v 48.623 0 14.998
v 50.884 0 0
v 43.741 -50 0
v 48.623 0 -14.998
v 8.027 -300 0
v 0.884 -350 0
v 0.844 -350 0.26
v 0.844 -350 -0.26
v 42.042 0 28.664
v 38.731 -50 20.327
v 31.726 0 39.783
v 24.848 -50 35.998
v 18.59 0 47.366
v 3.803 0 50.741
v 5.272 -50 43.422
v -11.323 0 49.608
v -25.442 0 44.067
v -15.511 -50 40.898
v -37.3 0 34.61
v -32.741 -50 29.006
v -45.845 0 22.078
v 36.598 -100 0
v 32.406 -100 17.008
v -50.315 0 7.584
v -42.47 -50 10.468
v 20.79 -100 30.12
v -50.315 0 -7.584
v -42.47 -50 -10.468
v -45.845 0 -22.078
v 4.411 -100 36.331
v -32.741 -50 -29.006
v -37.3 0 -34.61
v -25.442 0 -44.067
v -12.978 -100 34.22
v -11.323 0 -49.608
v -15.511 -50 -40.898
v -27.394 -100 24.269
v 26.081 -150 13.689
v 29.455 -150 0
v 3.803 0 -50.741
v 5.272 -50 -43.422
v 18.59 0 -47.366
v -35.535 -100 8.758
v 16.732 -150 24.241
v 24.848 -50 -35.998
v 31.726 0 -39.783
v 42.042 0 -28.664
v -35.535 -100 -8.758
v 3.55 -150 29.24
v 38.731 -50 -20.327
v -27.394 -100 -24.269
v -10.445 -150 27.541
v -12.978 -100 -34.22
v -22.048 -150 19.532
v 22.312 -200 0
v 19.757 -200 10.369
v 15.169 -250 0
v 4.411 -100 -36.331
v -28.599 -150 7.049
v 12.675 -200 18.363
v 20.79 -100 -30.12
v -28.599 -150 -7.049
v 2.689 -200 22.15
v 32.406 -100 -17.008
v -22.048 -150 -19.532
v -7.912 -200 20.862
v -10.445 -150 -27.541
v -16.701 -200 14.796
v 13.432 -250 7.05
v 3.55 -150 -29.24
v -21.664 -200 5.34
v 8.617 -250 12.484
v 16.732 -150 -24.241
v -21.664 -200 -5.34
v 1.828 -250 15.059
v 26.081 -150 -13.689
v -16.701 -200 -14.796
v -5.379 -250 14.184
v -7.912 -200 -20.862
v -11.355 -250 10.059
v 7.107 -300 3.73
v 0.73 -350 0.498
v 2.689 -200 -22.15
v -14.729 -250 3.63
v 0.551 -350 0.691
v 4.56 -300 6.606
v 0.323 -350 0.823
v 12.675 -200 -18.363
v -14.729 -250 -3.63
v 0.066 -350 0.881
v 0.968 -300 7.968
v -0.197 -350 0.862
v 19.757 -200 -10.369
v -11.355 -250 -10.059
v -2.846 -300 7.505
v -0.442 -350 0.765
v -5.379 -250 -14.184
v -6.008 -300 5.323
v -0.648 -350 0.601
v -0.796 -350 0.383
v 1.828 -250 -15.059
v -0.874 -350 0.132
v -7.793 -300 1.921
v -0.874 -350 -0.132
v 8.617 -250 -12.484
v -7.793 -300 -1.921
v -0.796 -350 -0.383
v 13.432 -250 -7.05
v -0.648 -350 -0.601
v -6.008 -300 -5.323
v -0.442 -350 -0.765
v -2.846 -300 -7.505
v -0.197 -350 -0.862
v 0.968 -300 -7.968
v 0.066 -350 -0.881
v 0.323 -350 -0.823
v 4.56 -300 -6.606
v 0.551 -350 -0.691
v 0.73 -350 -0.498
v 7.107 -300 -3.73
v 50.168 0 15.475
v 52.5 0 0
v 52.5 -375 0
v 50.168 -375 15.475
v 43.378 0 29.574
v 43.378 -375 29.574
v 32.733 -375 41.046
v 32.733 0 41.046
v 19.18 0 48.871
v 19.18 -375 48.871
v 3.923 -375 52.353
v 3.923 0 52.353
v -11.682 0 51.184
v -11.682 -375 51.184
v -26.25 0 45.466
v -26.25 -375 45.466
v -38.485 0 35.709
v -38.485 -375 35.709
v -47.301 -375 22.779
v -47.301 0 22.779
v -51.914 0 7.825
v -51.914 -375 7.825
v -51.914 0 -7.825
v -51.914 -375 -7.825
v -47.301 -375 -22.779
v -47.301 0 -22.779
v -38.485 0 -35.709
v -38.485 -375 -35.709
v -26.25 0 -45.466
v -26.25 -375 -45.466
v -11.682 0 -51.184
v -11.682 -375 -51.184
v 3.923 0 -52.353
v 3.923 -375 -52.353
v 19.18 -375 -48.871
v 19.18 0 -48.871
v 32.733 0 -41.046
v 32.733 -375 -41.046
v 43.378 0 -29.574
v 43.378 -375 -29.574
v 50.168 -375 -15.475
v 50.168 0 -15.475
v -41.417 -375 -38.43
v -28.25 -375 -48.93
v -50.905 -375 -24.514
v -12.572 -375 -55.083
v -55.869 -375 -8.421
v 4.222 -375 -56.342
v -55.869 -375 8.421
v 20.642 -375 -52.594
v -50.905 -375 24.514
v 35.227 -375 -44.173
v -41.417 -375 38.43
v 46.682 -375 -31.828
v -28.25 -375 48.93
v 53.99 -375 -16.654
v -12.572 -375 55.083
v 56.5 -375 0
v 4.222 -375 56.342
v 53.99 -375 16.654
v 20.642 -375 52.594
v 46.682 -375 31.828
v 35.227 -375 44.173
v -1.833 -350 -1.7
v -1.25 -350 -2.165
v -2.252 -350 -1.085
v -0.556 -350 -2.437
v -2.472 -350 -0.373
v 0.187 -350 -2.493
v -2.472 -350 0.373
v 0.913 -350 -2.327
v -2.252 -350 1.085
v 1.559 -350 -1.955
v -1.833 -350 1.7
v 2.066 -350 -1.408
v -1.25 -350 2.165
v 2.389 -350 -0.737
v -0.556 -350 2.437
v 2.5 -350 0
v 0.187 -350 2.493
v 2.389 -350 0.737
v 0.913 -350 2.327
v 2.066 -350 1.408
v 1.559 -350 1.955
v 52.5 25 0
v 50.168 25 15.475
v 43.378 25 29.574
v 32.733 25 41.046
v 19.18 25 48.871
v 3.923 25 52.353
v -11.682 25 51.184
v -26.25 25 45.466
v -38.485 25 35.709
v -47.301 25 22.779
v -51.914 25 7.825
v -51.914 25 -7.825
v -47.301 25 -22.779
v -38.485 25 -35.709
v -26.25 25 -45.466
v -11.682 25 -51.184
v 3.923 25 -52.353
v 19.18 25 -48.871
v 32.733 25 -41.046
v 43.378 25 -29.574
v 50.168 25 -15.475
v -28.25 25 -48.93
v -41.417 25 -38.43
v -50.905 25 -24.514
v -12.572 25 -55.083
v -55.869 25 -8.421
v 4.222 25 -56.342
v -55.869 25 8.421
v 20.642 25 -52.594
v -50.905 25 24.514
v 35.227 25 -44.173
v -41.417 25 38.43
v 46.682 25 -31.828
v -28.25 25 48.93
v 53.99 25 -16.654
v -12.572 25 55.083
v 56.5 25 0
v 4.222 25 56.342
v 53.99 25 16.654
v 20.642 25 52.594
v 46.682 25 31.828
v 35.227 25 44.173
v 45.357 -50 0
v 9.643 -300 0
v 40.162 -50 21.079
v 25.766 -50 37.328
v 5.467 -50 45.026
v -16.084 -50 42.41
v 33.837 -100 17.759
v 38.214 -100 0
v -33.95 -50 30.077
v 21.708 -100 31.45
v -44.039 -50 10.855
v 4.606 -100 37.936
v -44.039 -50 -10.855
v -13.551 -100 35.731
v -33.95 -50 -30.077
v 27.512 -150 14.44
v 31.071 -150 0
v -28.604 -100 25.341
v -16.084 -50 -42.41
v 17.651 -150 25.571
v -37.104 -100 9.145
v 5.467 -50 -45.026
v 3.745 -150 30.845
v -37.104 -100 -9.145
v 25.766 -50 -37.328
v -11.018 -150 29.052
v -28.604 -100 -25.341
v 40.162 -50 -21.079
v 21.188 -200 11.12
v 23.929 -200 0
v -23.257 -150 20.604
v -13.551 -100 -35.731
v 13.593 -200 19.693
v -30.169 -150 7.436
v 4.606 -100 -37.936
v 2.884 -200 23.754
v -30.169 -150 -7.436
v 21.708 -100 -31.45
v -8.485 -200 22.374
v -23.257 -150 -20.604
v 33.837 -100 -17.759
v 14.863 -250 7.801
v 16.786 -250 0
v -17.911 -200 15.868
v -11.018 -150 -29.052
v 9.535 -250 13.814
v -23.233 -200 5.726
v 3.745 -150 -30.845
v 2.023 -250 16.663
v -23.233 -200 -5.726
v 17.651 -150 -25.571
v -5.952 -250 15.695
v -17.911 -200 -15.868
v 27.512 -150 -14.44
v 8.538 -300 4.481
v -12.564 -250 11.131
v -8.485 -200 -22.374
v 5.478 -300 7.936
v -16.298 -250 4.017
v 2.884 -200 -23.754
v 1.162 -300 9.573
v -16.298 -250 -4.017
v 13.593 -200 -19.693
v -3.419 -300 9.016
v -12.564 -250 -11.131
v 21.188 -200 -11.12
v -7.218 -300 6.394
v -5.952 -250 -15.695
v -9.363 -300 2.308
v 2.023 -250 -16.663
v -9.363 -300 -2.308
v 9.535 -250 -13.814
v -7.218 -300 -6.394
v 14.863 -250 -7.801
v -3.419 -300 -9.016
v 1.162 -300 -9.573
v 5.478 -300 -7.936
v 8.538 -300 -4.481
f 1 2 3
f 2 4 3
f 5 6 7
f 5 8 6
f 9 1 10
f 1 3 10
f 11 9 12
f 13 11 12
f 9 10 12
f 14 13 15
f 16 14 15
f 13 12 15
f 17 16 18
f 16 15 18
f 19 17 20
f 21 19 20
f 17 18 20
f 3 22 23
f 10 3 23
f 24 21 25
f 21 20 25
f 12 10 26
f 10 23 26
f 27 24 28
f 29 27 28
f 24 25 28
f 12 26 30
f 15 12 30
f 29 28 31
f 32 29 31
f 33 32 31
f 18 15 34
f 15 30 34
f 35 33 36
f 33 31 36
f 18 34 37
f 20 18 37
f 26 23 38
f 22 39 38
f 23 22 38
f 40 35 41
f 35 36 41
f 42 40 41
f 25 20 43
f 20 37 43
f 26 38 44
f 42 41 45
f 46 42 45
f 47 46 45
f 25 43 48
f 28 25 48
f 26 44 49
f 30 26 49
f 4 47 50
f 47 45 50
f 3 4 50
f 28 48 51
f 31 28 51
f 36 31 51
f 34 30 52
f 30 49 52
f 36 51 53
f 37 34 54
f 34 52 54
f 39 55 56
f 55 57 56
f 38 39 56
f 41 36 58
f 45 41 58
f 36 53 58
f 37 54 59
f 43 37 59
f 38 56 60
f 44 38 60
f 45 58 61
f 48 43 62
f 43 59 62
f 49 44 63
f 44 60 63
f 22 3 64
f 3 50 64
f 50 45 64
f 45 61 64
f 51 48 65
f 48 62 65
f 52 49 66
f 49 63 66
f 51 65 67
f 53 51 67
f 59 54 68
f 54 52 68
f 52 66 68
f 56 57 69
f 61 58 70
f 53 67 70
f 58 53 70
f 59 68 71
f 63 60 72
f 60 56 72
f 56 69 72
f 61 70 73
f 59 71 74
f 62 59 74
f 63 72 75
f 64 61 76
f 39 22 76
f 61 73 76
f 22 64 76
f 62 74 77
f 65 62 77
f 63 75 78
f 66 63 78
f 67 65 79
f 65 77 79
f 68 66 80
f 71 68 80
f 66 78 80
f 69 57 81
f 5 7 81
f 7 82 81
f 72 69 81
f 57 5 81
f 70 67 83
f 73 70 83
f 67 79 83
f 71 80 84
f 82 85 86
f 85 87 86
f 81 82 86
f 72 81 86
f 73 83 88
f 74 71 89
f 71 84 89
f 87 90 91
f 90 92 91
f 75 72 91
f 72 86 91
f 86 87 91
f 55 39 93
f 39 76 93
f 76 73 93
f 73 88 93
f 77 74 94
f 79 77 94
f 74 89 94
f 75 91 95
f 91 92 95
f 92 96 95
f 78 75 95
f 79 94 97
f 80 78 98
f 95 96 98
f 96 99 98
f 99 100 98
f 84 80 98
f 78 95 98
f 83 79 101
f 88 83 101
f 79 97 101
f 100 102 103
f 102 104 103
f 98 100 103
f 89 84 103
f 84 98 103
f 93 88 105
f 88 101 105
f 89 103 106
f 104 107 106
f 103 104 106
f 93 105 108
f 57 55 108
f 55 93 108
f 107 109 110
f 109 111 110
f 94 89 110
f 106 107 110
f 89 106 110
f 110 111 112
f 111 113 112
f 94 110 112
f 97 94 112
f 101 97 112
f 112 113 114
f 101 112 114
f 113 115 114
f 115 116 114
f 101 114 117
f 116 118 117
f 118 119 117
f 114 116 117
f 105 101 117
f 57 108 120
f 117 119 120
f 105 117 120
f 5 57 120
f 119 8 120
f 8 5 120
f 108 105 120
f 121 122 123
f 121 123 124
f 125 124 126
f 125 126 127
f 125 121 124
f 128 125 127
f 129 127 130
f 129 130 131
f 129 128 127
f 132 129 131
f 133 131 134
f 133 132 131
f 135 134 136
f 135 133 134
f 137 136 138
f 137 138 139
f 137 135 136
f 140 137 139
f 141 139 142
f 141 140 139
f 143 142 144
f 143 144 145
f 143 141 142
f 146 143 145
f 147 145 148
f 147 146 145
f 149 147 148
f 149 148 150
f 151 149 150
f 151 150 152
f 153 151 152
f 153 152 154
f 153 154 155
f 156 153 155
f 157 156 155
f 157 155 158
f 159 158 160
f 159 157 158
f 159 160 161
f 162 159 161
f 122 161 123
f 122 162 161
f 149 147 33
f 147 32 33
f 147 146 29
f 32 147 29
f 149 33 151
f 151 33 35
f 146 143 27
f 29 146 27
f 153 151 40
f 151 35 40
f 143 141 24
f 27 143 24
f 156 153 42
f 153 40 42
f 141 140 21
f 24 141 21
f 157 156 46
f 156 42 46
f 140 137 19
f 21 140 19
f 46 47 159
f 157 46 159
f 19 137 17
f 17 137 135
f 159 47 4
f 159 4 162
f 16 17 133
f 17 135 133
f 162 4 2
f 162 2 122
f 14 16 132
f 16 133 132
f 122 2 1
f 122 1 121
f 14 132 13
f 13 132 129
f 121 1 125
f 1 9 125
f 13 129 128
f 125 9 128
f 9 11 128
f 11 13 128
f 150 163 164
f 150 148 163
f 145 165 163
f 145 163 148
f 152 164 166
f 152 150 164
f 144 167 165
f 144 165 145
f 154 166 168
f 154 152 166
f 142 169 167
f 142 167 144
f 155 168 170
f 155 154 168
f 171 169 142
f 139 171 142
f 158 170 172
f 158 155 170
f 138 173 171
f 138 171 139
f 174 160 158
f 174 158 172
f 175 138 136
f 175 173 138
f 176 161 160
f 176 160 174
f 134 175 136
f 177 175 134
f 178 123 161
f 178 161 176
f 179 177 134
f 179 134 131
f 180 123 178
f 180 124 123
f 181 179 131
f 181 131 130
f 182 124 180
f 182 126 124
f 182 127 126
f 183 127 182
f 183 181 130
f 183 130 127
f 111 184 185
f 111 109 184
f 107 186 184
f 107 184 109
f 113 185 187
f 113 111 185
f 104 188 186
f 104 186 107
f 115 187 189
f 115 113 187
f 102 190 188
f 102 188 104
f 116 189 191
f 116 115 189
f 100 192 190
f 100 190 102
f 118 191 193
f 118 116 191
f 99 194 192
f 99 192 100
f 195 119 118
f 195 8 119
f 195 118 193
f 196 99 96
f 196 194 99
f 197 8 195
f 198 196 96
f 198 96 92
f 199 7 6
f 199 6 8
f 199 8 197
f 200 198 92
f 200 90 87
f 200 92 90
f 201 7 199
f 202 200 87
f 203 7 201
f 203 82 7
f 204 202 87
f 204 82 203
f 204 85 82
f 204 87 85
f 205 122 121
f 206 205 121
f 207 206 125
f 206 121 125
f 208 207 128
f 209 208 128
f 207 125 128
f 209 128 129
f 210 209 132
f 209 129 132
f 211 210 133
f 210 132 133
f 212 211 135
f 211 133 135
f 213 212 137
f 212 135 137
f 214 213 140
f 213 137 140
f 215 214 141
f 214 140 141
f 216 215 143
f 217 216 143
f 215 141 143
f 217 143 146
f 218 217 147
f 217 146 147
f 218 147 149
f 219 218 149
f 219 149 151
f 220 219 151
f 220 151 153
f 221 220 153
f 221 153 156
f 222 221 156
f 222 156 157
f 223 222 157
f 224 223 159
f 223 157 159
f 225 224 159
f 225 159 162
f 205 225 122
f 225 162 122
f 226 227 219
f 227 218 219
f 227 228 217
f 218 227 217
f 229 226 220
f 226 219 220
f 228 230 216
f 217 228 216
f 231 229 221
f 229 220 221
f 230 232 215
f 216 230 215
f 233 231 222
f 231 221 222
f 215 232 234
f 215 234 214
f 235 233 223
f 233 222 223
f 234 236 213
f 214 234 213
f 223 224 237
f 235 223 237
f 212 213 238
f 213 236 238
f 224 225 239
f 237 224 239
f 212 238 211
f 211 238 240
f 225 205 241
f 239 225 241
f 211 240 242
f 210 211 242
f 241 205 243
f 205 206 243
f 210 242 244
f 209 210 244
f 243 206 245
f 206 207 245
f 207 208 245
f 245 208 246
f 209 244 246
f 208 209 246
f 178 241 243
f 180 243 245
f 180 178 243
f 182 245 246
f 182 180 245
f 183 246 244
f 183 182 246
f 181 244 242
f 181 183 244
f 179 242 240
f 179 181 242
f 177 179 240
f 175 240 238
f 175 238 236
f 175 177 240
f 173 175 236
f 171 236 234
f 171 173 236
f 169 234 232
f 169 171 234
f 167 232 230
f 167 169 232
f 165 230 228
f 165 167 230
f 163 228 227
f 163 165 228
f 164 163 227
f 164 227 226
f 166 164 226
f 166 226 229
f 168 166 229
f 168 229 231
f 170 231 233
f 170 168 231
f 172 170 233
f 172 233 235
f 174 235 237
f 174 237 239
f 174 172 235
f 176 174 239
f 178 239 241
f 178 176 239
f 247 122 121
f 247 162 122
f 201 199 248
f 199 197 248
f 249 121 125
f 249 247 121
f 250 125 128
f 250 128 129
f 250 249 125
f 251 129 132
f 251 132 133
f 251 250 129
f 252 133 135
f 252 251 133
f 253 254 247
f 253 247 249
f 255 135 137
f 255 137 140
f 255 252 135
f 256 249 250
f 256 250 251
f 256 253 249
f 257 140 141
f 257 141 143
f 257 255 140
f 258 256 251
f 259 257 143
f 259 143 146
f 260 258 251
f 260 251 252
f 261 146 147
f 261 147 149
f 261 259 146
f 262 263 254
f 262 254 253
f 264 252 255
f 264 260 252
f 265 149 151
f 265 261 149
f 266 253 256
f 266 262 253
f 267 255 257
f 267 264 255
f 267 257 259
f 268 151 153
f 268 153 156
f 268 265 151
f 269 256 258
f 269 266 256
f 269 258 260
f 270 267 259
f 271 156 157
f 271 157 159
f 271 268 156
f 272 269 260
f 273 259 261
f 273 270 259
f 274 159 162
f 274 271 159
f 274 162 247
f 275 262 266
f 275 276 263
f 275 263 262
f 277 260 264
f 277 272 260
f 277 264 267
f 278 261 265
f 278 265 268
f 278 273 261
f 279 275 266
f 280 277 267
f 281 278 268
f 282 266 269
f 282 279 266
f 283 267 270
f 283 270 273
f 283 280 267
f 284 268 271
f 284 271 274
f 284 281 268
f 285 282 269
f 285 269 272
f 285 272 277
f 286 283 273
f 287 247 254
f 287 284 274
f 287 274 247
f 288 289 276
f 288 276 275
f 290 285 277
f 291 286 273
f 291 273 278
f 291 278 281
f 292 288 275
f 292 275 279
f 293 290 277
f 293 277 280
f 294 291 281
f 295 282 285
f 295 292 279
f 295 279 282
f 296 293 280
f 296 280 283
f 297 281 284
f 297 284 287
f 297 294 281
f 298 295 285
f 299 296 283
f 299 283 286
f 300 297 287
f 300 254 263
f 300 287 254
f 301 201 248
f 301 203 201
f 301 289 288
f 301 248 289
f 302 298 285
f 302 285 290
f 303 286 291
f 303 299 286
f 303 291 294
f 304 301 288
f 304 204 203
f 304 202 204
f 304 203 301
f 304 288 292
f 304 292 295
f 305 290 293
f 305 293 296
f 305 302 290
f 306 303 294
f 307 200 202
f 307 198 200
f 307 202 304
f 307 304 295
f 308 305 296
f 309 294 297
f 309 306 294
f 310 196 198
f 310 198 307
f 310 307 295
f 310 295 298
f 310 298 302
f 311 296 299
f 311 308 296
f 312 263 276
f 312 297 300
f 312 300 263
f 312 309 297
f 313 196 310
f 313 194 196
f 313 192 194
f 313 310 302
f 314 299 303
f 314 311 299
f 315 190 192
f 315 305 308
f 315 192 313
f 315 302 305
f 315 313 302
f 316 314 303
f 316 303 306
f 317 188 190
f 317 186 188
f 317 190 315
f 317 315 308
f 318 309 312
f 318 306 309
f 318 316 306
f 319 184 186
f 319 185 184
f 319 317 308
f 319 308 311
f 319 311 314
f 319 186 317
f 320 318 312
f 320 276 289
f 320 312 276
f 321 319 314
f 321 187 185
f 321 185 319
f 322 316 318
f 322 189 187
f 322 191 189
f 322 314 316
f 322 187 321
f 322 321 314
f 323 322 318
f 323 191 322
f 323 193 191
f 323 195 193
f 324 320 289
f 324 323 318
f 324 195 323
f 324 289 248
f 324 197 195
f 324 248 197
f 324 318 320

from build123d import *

# Parameters (mm, degrees)
F0_R          = 52.5
F2_R          = 2.5
F4_T          = -1.6
F0_R_2        = 56.5
F5_DEPTH      = 375
F5_DEPTH_BACK = 25


with BuildPart() as f3:
    # F0 (on Front) → F3 section 0
    with BuildSketch(Plane.XZ):
        Circle(F0_R)
    # F2 (on offset) → F3 section 1
    with BuildSketch(Plane.XZ.offset(350)):
        Circle(F2_R)
    loft()

    # F4
    f4_openings = [f3.faces().sort_by_distance(p)[0] for p in [
        (0, 0, 0),
        (0, -350, 0),
    ]]
    offset(amount=F4_T, openings=f4_openings, kind=Kind.INTERSECTION)


with BuildPart() as f5:
    # F0 (on Front) → F5 (new body, two sides)
    with BuildSketch(Plane.XZ) as f5_sk:
        Circle(F0_R_2)
        Circle(F0_R, mode=Mode.SUBTRACT)
    extrude(amount=F5_DEPTH)
    extrude(f5_sk.sketch, amount=-F5_DEPTH_BACK)


solid = Compound([f3.part, f5.part])
